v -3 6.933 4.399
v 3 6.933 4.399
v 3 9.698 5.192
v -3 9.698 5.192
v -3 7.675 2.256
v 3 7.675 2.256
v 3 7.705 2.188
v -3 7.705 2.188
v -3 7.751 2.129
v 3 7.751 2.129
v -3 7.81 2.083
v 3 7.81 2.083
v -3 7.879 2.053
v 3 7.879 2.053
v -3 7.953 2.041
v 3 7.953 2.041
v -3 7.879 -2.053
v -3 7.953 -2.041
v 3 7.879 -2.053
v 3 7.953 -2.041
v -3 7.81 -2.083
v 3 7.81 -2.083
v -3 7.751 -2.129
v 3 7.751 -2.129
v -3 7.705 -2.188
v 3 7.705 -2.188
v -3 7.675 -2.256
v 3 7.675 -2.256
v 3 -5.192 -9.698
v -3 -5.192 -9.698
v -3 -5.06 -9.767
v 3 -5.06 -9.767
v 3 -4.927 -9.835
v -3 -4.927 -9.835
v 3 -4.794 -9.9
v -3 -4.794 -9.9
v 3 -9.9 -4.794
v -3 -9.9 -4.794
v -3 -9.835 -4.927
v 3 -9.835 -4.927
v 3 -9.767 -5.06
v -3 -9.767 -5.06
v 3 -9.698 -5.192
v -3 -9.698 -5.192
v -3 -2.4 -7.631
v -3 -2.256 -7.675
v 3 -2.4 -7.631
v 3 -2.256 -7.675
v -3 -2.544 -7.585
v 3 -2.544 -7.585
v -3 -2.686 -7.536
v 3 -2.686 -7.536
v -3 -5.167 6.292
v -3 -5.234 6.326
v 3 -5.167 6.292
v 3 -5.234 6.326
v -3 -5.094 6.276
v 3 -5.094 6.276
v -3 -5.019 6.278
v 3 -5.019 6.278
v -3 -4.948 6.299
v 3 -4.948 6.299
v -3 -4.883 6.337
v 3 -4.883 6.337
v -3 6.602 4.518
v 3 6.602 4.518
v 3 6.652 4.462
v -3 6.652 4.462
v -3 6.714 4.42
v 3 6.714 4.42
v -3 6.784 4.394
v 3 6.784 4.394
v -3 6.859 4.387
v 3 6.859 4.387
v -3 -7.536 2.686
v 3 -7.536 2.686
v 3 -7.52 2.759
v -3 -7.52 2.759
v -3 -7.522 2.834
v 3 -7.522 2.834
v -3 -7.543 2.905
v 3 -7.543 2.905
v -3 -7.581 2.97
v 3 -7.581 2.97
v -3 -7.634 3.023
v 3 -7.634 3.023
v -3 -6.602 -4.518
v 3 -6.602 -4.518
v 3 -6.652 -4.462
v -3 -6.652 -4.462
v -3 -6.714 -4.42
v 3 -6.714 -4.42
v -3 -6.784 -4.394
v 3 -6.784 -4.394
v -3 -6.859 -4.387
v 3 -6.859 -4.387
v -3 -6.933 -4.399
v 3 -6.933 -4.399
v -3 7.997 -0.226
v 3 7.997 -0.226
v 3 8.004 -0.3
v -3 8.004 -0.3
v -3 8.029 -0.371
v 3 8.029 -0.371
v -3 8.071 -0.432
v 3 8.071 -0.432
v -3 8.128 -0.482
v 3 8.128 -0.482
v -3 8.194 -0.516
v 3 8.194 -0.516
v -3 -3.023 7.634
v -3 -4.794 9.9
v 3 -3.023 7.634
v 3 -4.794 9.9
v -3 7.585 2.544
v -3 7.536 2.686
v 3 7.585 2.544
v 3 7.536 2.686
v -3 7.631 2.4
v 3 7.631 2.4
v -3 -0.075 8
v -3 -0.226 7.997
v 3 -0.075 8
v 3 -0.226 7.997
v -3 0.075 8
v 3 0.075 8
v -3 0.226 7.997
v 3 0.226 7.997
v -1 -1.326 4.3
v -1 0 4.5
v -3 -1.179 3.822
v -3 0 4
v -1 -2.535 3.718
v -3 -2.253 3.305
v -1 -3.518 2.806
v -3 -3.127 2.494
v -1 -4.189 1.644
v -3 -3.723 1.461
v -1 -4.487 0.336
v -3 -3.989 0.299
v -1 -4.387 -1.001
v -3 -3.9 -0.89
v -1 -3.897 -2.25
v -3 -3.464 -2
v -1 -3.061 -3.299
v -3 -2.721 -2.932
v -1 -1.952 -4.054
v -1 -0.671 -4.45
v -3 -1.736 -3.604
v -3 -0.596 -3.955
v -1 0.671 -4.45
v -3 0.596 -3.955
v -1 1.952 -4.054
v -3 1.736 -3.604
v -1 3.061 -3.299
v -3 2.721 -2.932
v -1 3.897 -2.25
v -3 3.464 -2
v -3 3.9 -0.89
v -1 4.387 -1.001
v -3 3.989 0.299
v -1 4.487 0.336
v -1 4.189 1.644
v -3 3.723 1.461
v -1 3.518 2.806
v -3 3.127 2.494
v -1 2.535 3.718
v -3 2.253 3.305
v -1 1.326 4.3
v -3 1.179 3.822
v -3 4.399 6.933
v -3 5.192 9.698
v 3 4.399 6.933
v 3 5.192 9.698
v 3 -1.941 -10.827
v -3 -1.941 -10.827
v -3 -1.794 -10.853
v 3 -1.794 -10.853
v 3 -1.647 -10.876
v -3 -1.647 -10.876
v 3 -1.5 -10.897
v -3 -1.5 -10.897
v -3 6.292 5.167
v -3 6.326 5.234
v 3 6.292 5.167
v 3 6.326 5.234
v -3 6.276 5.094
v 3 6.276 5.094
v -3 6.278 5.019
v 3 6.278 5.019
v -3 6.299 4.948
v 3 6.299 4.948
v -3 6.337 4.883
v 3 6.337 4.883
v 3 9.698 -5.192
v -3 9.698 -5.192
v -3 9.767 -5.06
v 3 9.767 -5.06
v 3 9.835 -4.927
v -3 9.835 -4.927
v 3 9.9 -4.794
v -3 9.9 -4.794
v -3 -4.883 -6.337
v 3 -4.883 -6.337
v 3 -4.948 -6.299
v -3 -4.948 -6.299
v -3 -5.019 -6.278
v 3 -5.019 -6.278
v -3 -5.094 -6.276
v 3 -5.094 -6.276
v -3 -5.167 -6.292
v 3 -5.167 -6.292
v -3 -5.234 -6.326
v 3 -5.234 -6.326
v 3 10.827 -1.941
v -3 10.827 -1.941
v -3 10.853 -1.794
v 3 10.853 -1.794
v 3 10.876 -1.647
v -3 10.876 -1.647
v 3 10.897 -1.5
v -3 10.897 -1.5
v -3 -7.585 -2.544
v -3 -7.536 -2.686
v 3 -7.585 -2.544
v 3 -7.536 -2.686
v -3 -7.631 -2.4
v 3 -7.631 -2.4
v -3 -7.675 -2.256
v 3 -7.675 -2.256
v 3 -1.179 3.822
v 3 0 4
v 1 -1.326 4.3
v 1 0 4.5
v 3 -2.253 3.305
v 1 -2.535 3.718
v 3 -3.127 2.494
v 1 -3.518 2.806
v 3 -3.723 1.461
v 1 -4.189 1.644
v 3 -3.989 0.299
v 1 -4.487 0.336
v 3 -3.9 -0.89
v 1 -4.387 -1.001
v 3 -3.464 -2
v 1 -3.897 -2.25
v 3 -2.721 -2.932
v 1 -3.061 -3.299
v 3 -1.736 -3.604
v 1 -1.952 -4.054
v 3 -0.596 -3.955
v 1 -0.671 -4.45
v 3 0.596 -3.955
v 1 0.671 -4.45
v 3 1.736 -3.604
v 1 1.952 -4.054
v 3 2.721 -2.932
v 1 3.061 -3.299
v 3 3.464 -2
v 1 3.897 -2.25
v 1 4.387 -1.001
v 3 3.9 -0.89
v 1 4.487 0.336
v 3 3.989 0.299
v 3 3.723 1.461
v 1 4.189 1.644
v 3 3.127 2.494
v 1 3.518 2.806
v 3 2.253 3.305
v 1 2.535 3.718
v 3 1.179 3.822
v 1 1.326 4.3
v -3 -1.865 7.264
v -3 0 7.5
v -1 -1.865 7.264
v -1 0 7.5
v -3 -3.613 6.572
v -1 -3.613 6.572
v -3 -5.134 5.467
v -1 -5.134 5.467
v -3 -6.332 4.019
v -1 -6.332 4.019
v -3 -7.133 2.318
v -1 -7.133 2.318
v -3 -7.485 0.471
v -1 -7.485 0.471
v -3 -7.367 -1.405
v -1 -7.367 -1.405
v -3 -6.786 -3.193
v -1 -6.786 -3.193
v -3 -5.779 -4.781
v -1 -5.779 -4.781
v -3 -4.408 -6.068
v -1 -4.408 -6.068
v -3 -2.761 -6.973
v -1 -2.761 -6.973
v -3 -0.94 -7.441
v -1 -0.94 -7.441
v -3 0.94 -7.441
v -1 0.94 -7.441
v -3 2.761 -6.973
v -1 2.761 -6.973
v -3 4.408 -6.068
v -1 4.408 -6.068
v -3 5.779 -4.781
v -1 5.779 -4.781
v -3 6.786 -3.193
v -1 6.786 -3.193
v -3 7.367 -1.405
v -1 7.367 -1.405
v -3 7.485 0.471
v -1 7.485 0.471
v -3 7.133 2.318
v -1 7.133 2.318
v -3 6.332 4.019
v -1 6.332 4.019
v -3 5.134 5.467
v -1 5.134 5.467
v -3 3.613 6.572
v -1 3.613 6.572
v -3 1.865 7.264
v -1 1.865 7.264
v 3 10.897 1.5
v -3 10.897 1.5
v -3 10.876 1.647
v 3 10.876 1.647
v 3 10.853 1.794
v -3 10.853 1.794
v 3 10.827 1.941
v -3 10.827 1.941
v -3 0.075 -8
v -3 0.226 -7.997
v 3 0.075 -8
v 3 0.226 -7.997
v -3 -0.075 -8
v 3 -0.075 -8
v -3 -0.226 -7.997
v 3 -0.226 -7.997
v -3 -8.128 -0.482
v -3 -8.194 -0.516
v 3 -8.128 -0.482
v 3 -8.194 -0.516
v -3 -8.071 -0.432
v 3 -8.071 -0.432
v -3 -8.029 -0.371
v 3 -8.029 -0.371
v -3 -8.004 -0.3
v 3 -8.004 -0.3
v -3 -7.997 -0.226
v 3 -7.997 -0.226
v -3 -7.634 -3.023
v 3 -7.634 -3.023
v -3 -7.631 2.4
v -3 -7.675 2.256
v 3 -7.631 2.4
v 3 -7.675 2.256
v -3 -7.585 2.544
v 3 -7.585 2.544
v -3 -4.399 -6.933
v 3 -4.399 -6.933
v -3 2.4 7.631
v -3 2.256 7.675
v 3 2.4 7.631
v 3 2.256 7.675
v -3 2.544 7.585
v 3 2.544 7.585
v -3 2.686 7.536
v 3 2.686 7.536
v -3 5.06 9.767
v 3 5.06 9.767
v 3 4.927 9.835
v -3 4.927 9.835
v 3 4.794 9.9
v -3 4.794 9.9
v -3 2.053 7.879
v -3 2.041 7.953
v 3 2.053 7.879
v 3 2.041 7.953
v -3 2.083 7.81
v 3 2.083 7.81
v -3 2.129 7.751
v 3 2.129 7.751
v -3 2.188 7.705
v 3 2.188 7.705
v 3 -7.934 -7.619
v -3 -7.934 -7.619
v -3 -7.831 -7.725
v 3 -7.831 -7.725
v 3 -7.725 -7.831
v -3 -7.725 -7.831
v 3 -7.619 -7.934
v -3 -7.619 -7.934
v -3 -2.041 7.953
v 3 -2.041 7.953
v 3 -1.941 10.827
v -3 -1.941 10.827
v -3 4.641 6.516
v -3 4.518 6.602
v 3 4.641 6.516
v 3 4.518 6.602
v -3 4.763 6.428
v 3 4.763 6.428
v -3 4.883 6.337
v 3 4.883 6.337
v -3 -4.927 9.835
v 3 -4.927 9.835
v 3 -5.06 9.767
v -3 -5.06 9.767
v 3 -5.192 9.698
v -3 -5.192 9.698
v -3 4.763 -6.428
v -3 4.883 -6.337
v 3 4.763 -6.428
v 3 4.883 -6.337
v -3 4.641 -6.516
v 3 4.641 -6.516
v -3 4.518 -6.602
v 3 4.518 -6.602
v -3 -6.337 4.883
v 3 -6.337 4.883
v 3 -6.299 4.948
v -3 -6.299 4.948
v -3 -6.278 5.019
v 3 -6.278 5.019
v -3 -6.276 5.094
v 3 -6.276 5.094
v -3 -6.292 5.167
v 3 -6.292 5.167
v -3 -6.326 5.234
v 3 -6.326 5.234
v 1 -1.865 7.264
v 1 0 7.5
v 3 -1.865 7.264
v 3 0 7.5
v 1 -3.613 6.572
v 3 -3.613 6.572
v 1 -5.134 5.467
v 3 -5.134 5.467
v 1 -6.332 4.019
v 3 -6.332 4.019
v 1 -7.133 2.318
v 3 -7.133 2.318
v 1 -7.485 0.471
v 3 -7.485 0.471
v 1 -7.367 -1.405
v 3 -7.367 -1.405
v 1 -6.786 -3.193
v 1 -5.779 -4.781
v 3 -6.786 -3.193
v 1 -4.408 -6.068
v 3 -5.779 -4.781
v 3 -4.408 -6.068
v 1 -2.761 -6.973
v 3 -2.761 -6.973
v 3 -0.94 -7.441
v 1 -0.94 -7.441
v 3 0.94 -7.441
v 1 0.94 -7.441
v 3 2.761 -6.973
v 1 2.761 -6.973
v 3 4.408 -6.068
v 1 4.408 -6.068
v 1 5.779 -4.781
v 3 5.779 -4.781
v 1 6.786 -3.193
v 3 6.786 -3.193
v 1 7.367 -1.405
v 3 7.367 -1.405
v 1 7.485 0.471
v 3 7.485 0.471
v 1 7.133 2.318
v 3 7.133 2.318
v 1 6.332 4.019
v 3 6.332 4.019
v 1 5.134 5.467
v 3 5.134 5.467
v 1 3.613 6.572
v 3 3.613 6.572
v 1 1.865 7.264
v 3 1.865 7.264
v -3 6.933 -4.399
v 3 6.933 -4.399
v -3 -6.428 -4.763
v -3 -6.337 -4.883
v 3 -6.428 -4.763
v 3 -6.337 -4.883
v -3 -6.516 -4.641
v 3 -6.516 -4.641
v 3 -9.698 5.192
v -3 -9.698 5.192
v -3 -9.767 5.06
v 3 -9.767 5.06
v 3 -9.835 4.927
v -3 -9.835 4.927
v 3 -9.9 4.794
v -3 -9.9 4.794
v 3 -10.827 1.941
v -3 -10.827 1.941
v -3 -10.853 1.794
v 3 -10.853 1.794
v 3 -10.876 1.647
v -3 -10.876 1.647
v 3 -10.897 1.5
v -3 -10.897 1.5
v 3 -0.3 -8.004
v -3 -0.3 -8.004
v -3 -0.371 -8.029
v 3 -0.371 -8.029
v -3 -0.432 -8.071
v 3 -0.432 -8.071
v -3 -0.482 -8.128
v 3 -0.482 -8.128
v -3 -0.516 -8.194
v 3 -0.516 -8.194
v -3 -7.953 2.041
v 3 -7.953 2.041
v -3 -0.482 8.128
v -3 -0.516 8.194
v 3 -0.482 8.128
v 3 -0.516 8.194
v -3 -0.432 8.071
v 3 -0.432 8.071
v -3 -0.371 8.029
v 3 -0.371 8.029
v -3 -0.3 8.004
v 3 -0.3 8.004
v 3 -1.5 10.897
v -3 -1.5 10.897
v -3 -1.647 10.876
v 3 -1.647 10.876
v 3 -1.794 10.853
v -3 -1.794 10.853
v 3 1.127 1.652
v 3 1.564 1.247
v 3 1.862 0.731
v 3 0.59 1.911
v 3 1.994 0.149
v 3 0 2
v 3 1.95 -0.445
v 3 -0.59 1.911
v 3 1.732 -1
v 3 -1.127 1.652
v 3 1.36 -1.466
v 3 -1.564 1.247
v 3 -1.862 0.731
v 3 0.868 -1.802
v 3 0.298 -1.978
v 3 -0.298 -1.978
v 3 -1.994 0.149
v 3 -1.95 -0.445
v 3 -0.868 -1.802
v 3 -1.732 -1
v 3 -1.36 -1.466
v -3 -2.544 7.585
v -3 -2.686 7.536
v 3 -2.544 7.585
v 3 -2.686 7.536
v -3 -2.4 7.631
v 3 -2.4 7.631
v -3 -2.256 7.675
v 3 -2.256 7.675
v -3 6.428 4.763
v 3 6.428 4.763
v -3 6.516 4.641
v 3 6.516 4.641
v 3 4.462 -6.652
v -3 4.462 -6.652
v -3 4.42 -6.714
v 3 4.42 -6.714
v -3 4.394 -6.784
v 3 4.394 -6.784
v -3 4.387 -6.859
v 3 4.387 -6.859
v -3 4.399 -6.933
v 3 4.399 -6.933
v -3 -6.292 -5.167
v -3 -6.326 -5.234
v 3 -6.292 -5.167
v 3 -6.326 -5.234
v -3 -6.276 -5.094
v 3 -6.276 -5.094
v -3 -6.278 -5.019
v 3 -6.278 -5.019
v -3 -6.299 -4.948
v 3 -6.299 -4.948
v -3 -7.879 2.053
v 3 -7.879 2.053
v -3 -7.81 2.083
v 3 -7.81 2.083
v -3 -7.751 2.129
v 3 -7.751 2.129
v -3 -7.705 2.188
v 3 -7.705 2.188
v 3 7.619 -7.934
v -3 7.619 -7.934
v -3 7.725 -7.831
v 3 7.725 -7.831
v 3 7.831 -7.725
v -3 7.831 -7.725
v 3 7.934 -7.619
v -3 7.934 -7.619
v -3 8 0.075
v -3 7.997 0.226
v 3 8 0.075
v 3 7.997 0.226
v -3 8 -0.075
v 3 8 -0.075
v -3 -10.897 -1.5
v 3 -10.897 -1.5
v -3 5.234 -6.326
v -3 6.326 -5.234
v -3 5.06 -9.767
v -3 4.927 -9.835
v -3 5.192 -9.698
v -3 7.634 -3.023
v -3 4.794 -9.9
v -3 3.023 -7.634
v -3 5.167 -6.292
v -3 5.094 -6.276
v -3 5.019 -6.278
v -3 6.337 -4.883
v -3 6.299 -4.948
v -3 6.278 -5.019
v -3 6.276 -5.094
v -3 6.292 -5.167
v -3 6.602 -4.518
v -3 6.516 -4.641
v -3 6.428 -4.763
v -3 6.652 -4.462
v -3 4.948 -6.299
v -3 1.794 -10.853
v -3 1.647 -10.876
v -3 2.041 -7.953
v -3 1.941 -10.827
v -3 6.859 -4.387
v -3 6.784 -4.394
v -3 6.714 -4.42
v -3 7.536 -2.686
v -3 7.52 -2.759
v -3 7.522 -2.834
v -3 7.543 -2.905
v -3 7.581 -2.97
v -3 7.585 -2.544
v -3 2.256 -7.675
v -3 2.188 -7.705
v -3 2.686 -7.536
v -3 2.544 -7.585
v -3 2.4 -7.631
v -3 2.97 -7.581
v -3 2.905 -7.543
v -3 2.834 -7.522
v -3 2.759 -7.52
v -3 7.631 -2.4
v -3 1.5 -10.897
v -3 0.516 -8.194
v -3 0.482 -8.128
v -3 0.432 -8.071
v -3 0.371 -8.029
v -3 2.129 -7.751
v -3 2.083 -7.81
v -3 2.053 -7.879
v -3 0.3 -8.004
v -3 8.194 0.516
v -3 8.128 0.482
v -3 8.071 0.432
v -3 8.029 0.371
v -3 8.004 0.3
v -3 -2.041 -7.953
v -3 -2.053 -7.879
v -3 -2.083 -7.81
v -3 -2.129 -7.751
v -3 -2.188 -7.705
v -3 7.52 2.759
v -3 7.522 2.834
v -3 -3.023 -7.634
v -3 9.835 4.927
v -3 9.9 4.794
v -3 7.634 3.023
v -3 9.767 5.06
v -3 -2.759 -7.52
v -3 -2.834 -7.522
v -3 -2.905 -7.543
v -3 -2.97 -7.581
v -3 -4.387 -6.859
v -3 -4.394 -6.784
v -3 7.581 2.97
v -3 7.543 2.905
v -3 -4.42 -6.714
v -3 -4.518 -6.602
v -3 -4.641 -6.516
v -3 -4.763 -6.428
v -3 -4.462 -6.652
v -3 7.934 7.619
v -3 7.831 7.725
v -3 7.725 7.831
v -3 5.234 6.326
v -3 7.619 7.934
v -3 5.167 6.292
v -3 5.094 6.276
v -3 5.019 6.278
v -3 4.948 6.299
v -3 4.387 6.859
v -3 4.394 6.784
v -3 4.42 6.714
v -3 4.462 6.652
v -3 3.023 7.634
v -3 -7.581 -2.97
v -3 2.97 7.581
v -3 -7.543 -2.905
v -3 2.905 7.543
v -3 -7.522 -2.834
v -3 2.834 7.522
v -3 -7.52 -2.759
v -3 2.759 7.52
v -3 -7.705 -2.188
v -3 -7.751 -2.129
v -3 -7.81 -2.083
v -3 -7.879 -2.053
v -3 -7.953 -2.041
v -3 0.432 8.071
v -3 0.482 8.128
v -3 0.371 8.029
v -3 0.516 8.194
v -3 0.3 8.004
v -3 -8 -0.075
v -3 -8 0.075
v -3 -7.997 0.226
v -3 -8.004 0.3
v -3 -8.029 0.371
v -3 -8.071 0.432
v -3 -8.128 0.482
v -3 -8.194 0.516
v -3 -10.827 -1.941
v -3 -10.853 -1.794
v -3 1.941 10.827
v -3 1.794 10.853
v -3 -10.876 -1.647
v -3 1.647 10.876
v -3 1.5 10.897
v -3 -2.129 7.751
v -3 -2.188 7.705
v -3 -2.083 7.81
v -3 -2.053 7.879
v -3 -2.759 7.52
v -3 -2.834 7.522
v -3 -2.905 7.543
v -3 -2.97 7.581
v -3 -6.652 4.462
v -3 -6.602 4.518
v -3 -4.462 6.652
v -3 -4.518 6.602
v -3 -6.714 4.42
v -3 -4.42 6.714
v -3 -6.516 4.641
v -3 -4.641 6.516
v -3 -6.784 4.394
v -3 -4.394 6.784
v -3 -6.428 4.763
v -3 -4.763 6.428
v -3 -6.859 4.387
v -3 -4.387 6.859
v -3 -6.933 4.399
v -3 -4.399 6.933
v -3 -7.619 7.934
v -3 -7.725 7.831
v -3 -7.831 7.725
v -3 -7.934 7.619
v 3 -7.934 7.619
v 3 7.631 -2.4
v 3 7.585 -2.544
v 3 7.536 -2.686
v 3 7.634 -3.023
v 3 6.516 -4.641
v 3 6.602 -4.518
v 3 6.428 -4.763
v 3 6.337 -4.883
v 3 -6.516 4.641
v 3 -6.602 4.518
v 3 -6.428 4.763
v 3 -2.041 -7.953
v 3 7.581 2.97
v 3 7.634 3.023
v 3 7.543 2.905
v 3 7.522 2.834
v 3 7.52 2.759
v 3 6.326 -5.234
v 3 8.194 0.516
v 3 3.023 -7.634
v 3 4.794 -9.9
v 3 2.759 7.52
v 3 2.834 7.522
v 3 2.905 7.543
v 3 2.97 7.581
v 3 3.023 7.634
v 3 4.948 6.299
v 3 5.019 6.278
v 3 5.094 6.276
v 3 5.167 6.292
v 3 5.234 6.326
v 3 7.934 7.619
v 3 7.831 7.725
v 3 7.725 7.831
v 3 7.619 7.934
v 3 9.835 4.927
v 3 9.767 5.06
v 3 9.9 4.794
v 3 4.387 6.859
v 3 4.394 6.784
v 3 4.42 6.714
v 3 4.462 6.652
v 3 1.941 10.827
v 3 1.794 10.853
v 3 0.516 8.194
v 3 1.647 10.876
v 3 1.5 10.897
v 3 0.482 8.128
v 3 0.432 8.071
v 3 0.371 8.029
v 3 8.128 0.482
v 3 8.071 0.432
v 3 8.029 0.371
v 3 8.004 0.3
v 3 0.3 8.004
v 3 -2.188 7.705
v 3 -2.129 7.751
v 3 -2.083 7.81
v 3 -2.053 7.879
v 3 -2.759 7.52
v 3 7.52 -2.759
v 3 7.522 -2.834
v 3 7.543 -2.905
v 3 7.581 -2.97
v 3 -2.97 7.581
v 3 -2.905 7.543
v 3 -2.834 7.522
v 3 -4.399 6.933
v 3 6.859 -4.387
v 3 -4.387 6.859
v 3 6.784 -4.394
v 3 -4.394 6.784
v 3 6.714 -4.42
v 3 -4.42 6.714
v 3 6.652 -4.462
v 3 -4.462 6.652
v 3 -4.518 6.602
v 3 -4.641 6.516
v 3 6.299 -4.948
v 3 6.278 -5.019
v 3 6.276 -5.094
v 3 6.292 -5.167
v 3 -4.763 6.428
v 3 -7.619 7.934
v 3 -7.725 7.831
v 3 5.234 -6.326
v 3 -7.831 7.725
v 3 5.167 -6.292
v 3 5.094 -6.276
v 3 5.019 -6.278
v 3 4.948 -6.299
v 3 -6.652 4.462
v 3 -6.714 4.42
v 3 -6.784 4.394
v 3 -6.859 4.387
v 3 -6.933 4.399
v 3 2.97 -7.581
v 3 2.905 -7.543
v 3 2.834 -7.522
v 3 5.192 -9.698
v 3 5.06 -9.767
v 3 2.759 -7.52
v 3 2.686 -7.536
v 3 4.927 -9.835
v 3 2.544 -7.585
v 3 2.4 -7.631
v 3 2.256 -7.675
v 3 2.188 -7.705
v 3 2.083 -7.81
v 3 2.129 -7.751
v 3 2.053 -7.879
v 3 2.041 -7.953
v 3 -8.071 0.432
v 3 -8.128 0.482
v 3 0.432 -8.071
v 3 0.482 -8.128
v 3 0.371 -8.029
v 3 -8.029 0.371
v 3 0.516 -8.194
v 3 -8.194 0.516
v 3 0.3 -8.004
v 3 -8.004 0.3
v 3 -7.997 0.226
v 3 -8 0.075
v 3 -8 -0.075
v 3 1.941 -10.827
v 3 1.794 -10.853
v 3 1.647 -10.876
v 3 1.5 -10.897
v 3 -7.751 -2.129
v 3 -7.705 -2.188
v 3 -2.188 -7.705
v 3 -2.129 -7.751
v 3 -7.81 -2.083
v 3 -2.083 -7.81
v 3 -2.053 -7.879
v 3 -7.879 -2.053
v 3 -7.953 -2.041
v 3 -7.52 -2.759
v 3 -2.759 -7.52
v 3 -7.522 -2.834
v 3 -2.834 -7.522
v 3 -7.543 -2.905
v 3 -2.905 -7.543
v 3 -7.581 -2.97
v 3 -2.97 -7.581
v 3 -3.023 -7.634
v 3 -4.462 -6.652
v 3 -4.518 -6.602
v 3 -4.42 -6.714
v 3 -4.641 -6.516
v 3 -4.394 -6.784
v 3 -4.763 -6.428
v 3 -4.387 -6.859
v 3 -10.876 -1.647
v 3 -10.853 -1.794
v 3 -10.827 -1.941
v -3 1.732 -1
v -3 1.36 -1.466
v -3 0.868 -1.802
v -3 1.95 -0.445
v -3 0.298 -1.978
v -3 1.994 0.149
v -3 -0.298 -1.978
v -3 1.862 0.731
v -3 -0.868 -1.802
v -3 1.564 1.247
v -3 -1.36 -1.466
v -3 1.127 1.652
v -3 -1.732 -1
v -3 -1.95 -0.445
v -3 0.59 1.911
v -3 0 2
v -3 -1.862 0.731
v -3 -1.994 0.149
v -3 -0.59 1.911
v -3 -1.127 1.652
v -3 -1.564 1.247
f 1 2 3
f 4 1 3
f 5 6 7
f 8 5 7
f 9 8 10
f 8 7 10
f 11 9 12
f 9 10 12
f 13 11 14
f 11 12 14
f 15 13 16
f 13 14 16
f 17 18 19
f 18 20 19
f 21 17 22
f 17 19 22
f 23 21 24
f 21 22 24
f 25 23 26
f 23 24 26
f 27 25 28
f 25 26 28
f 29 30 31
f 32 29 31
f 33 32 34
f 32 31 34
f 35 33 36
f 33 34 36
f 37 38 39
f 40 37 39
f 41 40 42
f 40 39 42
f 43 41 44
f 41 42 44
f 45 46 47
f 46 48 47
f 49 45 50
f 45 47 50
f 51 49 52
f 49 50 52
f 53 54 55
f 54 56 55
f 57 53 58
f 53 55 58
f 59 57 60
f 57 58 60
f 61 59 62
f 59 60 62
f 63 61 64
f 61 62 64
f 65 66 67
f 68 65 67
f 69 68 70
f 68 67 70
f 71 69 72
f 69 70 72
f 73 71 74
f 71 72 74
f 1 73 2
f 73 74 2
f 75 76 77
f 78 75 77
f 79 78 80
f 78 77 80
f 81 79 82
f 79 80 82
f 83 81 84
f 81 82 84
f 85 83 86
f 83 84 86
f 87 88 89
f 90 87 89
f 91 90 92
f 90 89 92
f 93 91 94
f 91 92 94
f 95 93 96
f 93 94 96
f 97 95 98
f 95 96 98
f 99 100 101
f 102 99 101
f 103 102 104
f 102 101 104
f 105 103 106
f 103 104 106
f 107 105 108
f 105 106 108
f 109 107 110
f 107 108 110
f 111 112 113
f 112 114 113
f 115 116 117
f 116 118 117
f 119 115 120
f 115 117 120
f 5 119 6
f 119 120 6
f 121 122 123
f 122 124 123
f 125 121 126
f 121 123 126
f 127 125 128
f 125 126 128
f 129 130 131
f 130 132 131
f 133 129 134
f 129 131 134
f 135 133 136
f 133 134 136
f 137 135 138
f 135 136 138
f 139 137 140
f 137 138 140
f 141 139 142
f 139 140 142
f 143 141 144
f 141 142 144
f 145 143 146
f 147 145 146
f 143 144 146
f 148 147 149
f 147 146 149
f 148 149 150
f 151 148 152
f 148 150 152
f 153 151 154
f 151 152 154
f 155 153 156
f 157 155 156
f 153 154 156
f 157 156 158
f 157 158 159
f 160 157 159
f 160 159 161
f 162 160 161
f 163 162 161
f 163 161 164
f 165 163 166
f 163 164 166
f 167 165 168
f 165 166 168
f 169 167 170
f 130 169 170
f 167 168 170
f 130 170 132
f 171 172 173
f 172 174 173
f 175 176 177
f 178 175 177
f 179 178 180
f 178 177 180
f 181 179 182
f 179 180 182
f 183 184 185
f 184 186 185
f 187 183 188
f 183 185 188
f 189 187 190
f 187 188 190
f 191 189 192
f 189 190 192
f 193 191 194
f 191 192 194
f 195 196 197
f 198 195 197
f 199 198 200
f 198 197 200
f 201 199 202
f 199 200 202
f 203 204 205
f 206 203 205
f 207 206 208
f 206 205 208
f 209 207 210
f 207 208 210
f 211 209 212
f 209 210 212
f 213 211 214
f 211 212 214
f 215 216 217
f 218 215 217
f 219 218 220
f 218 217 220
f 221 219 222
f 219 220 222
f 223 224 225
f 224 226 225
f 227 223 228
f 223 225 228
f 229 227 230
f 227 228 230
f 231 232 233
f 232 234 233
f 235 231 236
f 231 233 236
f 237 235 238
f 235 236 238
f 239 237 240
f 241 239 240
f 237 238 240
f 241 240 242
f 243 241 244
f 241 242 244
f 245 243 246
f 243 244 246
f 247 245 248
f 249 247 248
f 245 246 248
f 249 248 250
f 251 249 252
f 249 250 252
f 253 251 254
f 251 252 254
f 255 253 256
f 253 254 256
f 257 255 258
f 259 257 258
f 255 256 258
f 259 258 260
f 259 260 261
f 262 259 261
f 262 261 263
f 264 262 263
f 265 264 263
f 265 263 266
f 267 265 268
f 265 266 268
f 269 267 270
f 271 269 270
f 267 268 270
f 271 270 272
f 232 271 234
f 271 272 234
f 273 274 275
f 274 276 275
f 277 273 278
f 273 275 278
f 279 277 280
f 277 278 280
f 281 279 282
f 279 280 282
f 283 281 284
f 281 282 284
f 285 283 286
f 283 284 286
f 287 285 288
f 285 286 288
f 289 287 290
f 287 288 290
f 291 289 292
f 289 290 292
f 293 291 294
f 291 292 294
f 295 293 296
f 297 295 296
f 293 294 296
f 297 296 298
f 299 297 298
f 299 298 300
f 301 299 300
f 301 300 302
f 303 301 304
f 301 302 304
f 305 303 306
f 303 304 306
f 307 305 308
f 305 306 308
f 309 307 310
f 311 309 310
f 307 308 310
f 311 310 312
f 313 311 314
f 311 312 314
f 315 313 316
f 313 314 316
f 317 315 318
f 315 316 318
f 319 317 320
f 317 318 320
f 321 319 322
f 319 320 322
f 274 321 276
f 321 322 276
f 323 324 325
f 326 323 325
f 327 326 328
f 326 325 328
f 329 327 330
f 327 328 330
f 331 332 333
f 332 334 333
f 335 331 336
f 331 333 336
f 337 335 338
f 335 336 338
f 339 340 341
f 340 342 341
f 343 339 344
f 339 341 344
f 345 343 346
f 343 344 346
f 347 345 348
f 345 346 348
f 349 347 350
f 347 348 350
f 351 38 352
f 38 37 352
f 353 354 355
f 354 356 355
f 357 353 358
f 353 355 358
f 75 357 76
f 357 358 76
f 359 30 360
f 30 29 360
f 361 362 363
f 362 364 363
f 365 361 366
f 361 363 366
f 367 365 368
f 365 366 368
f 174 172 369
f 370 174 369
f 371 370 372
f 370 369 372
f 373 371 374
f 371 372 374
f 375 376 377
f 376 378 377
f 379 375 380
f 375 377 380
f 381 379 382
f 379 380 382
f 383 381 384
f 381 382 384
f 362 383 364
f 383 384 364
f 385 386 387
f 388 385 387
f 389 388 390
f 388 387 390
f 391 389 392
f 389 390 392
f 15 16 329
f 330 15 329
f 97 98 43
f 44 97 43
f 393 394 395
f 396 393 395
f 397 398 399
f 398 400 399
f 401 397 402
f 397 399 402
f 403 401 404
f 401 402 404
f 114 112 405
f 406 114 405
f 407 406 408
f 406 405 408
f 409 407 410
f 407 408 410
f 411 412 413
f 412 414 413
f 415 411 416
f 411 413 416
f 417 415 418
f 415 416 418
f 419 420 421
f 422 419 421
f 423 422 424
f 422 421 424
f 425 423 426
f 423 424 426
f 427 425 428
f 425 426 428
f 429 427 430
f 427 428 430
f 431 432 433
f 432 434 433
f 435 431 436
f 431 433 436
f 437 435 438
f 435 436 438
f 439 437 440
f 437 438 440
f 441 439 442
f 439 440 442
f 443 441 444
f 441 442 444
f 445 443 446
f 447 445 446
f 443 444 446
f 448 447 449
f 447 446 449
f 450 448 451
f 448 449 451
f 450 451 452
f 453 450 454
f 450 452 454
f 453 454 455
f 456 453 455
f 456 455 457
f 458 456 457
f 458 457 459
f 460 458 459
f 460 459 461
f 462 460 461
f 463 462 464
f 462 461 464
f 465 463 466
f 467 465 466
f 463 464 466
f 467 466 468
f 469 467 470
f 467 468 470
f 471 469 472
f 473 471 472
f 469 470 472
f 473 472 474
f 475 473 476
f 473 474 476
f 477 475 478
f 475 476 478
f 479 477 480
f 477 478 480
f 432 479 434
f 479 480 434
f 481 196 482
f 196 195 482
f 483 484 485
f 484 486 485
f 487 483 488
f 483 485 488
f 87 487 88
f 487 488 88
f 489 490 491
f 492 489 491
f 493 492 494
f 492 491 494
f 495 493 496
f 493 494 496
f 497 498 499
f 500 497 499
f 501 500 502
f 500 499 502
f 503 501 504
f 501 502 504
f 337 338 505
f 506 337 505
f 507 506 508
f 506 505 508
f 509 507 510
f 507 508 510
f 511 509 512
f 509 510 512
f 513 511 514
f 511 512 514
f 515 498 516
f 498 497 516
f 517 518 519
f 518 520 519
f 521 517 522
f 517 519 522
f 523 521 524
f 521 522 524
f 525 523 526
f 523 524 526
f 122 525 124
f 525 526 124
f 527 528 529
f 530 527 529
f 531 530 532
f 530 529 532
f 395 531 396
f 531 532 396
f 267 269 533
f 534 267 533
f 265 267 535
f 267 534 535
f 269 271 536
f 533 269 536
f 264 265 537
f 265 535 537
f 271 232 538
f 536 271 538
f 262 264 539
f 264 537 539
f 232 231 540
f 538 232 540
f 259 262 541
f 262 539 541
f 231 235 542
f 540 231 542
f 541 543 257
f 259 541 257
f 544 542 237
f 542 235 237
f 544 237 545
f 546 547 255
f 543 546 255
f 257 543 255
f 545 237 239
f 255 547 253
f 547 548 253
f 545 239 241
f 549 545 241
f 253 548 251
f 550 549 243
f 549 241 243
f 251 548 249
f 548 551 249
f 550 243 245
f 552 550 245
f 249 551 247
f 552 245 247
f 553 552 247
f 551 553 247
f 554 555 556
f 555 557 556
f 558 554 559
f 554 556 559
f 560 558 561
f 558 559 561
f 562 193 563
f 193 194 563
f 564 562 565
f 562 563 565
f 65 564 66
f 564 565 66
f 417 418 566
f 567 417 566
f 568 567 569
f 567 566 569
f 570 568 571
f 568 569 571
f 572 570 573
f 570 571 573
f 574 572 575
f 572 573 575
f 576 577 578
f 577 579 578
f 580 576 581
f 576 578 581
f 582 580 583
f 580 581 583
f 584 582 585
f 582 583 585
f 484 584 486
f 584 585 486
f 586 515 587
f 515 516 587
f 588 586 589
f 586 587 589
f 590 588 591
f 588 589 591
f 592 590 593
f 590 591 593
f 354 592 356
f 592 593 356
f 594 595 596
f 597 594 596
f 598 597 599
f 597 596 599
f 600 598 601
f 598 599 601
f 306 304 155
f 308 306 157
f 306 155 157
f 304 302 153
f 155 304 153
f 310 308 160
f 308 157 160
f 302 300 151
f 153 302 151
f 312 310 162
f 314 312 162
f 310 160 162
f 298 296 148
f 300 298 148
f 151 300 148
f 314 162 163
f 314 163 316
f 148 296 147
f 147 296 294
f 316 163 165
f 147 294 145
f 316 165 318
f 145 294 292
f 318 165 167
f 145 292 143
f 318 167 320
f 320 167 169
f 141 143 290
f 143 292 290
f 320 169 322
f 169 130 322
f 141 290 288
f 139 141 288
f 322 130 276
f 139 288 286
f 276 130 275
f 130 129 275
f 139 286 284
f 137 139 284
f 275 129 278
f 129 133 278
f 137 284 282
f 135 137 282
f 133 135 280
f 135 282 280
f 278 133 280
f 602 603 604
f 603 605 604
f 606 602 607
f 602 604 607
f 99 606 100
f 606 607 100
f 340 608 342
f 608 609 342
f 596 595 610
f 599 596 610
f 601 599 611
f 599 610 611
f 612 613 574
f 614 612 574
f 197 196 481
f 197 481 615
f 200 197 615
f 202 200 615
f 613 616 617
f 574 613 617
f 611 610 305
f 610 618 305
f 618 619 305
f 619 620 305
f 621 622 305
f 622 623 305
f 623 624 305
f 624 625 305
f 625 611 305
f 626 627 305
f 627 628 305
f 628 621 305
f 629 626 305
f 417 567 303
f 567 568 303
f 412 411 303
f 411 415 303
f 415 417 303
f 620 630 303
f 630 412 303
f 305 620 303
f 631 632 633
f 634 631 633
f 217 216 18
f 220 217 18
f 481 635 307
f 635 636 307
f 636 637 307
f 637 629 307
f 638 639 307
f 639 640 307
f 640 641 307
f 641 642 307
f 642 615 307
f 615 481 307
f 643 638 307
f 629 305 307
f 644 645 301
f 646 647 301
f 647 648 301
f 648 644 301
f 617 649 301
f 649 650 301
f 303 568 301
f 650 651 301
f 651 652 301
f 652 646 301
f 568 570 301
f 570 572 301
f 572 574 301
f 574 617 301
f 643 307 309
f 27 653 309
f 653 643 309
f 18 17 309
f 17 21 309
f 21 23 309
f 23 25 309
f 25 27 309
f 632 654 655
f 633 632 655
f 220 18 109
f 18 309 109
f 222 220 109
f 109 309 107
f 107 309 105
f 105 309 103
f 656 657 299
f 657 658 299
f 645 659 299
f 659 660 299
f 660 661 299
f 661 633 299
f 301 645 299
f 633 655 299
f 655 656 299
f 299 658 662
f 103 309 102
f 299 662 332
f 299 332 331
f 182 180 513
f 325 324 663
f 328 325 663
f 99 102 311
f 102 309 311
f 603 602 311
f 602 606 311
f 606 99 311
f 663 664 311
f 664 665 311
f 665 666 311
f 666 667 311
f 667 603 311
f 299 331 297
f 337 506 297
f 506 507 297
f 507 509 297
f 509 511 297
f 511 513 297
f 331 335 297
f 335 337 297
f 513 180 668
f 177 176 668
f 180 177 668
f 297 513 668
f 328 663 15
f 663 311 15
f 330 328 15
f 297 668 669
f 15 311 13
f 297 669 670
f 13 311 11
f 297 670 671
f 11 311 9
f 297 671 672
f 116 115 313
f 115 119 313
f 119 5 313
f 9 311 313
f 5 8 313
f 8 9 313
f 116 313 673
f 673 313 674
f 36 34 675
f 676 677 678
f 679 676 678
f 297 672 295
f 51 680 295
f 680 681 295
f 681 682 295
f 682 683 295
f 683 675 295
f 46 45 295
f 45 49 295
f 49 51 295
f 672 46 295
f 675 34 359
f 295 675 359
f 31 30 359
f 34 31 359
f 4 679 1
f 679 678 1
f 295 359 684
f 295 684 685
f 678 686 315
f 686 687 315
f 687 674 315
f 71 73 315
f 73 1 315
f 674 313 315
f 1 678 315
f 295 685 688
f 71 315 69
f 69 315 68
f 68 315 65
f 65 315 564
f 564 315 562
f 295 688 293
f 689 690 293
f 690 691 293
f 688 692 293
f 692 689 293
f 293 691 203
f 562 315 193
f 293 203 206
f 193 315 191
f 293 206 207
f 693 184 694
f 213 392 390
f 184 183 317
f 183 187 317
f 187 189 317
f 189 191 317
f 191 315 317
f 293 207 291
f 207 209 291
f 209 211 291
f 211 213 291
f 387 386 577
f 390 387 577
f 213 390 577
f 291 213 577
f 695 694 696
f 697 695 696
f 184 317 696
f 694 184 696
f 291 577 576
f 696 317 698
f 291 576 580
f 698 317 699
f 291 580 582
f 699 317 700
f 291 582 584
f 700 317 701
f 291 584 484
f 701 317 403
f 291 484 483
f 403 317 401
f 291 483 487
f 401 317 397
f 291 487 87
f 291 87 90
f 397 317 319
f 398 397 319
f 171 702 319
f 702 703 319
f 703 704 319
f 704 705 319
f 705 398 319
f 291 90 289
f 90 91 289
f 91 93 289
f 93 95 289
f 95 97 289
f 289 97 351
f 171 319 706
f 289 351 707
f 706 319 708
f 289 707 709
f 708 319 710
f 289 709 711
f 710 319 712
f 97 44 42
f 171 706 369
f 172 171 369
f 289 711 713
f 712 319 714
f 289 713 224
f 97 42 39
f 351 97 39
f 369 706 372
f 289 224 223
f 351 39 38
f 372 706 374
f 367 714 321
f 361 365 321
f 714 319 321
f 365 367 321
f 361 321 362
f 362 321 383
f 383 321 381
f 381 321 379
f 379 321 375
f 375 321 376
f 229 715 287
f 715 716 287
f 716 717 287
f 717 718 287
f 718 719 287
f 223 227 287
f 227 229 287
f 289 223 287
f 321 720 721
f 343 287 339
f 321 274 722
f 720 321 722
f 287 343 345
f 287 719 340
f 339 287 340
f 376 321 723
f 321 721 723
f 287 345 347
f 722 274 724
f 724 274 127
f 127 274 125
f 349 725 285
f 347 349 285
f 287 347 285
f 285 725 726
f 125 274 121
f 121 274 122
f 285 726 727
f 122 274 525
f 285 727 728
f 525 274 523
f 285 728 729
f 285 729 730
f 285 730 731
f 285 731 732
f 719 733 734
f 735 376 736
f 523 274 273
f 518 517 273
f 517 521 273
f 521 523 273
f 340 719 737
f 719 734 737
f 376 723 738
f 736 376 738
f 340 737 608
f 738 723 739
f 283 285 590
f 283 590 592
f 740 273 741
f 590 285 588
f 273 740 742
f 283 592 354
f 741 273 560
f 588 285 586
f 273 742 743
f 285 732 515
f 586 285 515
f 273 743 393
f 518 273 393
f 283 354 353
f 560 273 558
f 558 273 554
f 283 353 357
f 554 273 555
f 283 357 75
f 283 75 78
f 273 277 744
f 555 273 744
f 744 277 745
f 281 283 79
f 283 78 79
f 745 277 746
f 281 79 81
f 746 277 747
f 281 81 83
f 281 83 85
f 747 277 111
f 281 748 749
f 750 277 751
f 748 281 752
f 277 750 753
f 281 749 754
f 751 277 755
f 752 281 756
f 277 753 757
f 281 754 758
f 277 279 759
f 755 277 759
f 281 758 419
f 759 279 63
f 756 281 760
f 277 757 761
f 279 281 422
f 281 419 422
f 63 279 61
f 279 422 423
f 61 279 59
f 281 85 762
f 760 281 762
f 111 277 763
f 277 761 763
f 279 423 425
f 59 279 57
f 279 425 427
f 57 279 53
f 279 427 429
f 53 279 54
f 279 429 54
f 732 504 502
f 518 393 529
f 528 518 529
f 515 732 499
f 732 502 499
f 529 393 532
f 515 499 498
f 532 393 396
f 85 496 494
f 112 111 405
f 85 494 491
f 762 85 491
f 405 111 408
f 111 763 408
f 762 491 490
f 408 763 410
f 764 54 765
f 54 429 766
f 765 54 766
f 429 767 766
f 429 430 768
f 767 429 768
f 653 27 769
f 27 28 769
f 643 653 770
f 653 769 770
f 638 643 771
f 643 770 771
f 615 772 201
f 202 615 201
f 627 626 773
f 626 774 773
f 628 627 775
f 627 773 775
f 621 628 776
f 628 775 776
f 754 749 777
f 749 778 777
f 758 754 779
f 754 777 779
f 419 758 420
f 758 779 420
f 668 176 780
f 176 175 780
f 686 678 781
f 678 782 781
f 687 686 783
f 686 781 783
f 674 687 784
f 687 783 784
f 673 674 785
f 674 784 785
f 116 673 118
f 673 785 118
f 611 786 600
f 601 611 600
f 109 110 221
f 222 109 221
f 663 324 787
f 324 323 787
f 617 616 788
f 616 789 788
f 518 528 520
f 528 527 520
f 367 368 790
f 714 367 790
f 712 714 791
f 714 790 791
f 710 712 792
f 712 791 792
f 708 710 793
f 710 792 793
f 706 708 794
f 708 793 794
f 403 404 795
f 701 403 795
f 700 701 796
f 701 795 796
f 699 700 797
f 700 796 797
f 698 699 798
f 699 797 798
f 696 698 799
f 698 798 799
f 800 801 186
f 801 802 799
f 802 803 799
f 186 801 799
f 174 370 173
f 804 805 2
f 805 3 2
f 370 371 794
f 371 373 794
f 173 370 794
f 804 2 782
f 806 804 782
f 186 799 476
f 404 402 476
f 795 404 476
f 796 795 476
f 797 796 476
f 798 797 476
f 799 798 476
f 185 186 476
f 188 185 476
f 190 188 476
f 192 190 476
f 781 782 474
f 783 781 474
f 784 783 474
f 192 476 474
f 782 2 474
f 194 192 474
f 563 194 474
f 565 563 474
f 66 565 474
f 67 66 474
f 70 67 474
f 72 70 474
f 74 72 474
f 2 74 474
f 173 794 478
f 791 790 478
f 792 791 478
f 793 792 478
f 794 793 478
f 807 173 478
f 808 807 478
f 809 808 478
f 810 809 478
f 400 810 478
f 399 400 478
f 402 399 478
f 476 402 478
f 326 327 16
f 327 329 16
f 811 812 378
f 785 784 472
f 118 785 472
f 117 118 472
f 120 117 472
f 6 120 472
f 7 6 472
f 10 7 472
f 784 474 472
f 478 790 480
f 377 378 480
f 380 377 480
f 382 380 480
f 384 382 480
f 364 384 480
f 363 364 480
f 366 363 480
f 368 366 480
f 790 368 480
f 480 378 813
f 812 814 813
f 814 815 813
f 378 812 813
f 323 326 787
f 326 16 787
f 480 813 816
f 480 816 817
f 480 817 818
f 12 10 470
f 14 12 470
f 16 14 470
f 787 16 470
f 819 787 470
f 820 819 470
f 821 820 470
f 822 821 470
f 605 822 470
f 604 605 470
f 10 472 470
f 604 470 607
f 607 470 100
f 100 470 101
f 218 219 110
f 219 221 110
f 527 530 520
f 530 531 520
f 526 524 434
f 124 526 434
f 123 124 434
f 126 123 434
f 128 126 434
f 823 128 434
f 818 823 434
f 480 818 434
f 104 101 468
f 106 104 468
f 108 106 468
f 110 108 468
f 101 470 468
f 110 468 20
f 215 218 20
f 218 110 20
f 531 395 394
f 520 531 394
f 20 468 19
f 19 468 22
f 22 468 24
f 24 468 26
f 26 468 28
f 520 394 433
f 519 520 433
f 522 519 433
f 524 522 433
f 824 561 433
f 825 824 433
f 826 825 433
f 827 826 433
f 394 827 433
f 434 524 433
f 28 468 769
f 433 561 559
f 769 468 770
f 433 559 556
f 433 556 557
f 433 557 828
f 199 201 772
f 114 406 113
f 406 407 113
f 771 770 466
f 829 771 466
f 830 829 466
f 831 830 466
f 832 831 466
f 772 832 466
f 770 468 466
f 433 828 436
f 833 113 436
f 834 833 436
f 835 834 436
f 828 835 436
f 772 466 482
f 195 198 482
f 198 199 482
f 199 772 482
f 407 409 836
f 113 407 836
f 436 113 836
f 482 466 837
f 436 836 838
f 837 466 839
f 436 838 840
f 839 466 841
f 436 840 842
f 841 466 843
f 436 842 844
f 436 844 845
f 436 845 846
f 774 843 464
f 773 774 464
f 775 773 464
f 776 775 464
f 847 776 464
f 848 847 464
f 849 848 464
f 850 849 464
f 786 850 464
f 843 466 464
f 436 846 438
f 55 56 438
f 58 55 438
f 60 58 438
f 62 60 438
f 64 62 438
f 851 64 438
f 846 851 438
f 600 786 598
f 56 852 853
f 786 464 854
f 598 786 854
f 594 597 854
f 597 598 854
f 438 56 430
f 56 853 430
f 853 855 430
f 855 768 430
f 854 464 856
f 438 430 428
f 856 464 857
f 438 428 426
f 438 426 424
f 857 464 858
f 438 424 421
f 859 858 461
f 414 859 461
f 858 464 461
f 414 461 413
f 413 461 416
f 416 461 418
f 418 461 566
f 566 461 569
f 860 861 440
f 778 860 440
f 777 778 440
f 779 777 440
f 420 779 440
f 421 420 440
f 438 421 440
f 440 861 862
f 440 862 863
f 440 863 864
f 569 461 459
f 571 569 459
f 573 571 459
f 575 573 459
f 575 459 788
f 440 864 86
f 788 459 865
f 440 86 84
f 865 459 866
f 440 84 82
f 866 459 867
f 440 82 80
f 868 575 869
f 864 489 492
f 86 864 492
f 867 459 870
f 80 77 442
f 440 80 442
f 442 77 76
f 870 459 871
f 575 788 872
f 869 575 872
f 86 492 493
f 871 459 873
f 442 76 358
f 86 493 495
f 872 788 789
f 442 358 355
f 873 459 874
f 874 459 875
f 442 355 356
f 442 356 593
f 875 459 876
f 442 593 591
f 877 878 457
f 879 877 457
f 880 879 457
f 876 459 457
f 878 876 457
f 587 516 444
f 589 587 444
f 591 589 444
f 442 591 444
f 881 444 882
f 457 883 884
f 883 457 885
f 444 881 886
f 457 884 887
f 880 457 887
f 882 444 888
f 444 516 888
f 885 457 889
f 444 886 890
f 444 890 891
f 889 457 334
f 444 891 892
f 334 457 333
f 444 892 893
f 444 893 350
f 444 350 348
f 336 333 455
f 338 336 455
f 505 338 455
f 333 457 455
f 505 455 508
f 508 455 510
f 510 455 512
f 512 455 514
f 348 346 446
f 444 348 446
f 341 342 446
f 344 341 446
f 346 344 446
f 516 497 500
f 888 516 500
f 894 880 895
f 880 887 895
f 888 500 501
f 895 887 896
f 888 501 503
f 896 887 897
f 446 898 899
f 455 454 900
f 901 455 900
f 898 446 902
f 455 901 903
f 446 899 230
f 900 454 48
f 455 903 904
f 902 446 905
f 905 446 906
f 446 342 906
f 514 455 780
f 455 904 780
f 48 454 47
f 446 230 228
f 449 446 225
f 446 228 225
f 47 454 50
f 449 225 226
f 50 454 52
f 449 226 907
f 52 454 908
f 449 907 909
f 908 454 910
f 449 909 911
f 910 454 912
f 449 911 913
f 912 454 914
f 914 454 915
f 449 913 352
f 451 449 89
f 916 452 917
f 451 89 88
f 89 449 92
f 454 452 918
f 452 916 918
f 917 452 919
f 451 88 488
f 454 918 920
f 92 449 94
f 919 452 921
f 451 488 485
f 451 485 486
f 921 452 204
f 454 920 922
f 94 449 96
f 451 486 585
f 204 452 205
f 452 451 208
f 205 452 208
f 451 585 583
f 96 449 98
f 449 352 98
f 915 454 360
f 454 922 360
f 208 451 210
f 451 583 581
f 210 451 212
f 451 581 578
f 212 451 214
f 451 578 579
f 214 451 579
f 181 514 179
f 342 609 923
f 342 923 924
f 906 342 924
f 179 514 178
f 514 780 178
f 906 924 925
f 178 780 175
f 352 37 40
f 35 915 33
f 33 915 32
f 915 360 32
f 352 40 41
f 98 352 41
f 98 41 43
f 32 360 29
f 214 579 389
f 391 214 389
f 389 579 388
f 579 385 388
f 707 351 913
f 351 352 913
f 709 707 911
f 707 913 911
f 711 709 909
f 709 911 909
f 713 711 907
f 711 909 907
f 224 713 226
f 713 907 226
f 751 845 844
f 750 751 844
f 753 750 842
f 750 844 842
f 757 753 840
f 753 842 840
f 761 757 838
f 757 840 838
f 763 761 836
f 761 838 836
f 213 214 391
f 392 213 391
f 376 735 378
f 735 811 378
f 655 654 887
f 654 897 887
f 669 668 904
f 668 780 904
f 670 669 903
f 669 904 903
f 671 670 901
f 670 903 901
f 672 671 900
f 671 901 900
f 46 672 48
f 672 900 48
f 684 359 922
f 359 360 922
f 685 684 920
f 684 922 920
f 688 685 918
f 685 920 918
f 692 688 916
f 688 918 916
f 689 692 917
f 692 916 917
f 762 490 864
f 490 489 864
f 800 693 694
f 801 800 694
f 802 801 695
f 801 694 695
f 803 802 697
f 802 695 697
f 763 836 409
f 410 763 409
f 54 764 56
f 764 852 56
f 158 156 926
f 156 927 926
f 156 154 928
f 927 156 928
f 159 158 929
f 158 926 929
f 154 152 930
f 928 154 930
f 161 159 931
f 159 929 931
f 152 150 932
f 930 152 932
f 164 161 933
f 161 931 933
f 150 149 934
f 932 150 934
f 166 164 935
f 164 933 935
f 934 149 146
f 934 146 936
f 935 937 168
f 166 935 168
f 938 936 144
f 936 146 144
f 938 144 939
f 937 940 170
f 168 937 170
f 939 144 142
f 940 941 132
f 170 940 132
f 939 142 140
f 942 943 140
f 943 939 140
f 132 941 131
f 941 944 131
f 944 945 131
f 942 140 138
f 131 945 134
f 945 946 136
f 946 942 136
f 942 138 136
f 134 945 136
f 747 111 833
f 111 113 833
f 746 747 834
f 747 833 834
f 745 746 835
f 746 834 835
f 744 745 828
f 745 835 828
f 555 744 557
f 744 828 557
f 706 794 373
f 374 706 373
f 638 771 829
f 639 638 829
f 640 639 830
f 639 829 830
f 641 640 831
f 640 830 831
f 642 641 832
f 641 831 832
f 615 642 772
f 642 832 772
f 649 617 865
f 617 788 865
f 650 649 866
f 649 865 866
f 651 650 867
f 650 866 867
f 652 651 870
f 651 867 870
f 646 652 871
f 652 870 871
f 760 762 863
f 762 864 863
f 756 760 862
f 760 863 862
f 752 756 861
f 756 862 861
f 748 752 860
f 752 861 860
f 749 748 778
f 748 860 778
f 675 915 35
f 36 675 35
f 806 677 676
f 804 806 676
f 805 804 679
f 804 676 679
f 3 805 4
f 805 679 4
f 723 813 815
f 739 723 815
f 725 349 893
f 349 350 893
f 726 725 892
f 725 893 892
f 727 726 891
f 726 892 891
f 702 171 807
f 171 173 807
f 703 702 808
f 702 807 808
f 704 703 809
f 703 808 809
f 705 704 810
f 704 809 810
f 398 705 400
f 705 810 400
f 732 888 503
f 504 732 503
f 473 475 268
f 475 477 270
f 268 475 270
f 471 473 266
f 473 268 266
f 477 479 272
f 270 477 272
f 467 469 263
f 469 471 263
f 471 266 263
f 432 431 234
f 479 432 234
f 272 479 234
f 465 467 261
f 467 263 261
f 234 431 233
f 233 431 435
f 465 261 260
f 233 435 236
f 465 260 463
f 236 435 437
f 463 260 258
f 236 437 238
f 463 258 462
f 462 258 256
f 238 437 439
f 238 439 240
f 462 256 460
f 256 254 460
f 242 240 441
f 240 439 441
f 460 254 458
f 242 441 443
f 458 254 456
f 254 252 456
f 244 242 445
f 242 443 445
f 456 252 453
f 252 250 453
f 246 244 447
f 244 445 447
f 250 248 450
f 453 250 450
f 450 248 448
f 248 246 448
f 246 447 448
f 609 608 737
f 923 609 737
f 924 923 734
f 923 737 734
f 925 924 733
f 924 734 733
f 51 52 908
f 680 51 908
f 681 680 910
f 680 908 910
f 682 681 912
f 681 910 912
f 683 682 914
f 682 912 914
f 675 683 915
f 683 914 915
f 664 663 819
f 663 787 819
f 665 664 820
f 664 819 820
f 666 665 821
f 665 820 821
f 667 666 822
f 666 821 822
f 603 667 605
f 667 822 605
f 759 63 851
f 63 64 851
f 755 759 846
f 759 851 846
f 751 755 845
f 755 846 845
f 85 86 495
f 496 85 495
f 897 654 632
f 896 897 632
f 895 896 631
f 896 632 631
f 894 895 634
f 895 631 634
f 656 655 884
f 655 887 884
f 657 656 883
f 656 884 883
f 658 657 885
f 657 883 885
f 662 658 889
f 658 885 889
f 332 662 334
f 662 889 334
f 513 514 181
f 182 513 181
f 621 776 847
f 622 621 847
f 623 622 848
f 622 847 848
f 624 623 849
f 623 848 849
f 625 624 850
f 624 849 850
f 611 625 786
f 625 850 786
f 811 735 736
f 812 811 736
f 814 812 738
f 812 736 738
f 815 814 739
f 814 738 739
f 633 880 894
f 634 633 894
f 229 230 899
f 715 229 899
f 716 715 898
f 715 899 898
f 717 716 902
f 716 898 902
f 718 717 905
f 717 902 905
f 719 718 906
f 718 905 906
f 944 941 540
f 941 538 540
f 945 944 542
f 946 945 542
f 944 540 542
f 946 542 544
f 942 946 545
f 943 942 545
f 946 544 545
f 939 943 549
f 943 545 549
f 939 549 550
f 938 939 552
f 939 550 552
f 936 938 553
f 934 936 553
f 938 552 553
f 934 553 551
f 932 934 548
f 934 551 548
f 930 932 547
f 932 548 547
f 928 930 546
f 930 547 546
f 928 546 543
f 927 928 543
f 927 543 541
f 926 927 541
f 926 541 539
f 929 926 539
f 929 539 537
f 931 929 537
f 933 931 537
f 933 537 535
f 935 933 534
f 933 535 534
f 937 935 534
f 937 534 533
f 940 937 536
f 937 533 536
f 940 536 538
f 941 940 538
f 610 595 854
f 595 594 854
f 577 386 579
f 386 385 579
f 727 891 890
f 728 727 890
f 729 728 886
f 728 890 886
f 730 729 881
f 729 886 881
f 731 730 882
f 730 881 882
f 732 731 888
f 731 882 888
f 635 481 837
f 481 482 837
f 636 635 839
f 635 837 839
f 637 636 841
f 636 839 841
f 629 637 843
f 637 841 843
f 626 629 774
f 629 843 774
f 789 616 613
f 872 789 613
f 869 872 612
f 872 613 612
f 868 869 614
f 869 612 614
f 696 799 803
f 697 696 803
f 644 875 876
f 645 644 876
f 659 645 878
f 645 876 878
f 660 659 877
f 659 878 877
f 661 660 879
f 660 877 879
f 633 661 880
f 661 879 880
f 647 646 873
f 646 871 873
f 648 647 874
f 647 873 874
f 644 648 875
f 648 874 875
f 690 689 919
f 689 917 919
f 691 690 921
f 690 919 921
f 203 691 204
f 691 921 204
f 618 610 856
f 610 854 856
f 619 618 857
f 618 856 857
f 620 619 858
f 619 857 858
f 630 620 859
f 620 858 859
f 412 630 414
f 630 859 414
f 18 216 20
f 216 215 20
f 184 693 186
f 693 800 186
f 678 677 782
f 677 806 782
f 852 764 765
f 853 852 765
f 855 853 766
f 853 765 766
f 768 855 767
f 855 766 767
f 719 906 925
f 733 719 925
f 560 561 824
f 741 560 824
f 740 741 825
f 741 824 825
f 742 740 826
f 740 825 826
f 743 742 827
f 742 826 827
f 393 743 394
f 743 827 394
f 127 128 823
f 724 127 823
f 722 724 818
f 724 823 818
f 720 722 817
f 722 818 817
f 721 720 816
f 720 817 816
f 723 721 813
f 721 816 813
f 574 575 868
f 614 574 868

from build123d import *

# Parameters (mm, degrees)
F3_DEPTH = 3
F4_COUNT = 20


with BuildPart() as f1:
    # F0 (on Front) → F1 (revolve)
    with BuildSketch(Plane.XZ):
        Polygon((3, 11), (0, 11), (-3, 11), (-3, 7.5), (-1, 7.5), (-1, 4.5), (-3, 4), (-3, 2), (0, 2), (3, 2), (3, 4), (1, 4.5), (1, 7.5), (3, 7.5), align=None)
    revolve(axis=Axis((-1.5, 0, 0), (1, 0, 0)))

    # F2 (on Right) → F3 (cut, symmetric)
    with BuildSketch(Plane.YZ):
        with BuildLine():
            ThreePointArc((-0.2257569502, 7.996813978), (0, 8), (0.2257569502, 7.996813978))
            ThreePointArc((0.2257569502, 7.996813978), (0.4028108647, 8.0485451993), (0.516130622, 8.1940884592))
            Line((0.516130622, 8.1940884592), (1.5, 10.8972473589))
            ThreePointArc((1.5, 10.8972473589), (0, 11), (-1.5, 10.8972473589))
            Line((-1.5, 10.8972473589), (-0.516130622, 8.1940884592))
            ThreePointArc((-0.516130622, 8.1940884592), (-0.4028108647, 8.0485451993), (-0.2257569502, 7.996813978))
        make_face()
    f3 = extrude(amount=F3_DEPTH, both=True, mode=Mode.SUBTRACT)

    # F4: F3 ×20 about axis
    f4_axis = Axis((3, 0, 0), (-1, 0, 0))
    for i in range(1, F4_COUNT):
        add(f3.rotate(f4_axis, i * 360 / F4_COUNT), mode=Mode.SUBTRACT)


solid = f1.part
